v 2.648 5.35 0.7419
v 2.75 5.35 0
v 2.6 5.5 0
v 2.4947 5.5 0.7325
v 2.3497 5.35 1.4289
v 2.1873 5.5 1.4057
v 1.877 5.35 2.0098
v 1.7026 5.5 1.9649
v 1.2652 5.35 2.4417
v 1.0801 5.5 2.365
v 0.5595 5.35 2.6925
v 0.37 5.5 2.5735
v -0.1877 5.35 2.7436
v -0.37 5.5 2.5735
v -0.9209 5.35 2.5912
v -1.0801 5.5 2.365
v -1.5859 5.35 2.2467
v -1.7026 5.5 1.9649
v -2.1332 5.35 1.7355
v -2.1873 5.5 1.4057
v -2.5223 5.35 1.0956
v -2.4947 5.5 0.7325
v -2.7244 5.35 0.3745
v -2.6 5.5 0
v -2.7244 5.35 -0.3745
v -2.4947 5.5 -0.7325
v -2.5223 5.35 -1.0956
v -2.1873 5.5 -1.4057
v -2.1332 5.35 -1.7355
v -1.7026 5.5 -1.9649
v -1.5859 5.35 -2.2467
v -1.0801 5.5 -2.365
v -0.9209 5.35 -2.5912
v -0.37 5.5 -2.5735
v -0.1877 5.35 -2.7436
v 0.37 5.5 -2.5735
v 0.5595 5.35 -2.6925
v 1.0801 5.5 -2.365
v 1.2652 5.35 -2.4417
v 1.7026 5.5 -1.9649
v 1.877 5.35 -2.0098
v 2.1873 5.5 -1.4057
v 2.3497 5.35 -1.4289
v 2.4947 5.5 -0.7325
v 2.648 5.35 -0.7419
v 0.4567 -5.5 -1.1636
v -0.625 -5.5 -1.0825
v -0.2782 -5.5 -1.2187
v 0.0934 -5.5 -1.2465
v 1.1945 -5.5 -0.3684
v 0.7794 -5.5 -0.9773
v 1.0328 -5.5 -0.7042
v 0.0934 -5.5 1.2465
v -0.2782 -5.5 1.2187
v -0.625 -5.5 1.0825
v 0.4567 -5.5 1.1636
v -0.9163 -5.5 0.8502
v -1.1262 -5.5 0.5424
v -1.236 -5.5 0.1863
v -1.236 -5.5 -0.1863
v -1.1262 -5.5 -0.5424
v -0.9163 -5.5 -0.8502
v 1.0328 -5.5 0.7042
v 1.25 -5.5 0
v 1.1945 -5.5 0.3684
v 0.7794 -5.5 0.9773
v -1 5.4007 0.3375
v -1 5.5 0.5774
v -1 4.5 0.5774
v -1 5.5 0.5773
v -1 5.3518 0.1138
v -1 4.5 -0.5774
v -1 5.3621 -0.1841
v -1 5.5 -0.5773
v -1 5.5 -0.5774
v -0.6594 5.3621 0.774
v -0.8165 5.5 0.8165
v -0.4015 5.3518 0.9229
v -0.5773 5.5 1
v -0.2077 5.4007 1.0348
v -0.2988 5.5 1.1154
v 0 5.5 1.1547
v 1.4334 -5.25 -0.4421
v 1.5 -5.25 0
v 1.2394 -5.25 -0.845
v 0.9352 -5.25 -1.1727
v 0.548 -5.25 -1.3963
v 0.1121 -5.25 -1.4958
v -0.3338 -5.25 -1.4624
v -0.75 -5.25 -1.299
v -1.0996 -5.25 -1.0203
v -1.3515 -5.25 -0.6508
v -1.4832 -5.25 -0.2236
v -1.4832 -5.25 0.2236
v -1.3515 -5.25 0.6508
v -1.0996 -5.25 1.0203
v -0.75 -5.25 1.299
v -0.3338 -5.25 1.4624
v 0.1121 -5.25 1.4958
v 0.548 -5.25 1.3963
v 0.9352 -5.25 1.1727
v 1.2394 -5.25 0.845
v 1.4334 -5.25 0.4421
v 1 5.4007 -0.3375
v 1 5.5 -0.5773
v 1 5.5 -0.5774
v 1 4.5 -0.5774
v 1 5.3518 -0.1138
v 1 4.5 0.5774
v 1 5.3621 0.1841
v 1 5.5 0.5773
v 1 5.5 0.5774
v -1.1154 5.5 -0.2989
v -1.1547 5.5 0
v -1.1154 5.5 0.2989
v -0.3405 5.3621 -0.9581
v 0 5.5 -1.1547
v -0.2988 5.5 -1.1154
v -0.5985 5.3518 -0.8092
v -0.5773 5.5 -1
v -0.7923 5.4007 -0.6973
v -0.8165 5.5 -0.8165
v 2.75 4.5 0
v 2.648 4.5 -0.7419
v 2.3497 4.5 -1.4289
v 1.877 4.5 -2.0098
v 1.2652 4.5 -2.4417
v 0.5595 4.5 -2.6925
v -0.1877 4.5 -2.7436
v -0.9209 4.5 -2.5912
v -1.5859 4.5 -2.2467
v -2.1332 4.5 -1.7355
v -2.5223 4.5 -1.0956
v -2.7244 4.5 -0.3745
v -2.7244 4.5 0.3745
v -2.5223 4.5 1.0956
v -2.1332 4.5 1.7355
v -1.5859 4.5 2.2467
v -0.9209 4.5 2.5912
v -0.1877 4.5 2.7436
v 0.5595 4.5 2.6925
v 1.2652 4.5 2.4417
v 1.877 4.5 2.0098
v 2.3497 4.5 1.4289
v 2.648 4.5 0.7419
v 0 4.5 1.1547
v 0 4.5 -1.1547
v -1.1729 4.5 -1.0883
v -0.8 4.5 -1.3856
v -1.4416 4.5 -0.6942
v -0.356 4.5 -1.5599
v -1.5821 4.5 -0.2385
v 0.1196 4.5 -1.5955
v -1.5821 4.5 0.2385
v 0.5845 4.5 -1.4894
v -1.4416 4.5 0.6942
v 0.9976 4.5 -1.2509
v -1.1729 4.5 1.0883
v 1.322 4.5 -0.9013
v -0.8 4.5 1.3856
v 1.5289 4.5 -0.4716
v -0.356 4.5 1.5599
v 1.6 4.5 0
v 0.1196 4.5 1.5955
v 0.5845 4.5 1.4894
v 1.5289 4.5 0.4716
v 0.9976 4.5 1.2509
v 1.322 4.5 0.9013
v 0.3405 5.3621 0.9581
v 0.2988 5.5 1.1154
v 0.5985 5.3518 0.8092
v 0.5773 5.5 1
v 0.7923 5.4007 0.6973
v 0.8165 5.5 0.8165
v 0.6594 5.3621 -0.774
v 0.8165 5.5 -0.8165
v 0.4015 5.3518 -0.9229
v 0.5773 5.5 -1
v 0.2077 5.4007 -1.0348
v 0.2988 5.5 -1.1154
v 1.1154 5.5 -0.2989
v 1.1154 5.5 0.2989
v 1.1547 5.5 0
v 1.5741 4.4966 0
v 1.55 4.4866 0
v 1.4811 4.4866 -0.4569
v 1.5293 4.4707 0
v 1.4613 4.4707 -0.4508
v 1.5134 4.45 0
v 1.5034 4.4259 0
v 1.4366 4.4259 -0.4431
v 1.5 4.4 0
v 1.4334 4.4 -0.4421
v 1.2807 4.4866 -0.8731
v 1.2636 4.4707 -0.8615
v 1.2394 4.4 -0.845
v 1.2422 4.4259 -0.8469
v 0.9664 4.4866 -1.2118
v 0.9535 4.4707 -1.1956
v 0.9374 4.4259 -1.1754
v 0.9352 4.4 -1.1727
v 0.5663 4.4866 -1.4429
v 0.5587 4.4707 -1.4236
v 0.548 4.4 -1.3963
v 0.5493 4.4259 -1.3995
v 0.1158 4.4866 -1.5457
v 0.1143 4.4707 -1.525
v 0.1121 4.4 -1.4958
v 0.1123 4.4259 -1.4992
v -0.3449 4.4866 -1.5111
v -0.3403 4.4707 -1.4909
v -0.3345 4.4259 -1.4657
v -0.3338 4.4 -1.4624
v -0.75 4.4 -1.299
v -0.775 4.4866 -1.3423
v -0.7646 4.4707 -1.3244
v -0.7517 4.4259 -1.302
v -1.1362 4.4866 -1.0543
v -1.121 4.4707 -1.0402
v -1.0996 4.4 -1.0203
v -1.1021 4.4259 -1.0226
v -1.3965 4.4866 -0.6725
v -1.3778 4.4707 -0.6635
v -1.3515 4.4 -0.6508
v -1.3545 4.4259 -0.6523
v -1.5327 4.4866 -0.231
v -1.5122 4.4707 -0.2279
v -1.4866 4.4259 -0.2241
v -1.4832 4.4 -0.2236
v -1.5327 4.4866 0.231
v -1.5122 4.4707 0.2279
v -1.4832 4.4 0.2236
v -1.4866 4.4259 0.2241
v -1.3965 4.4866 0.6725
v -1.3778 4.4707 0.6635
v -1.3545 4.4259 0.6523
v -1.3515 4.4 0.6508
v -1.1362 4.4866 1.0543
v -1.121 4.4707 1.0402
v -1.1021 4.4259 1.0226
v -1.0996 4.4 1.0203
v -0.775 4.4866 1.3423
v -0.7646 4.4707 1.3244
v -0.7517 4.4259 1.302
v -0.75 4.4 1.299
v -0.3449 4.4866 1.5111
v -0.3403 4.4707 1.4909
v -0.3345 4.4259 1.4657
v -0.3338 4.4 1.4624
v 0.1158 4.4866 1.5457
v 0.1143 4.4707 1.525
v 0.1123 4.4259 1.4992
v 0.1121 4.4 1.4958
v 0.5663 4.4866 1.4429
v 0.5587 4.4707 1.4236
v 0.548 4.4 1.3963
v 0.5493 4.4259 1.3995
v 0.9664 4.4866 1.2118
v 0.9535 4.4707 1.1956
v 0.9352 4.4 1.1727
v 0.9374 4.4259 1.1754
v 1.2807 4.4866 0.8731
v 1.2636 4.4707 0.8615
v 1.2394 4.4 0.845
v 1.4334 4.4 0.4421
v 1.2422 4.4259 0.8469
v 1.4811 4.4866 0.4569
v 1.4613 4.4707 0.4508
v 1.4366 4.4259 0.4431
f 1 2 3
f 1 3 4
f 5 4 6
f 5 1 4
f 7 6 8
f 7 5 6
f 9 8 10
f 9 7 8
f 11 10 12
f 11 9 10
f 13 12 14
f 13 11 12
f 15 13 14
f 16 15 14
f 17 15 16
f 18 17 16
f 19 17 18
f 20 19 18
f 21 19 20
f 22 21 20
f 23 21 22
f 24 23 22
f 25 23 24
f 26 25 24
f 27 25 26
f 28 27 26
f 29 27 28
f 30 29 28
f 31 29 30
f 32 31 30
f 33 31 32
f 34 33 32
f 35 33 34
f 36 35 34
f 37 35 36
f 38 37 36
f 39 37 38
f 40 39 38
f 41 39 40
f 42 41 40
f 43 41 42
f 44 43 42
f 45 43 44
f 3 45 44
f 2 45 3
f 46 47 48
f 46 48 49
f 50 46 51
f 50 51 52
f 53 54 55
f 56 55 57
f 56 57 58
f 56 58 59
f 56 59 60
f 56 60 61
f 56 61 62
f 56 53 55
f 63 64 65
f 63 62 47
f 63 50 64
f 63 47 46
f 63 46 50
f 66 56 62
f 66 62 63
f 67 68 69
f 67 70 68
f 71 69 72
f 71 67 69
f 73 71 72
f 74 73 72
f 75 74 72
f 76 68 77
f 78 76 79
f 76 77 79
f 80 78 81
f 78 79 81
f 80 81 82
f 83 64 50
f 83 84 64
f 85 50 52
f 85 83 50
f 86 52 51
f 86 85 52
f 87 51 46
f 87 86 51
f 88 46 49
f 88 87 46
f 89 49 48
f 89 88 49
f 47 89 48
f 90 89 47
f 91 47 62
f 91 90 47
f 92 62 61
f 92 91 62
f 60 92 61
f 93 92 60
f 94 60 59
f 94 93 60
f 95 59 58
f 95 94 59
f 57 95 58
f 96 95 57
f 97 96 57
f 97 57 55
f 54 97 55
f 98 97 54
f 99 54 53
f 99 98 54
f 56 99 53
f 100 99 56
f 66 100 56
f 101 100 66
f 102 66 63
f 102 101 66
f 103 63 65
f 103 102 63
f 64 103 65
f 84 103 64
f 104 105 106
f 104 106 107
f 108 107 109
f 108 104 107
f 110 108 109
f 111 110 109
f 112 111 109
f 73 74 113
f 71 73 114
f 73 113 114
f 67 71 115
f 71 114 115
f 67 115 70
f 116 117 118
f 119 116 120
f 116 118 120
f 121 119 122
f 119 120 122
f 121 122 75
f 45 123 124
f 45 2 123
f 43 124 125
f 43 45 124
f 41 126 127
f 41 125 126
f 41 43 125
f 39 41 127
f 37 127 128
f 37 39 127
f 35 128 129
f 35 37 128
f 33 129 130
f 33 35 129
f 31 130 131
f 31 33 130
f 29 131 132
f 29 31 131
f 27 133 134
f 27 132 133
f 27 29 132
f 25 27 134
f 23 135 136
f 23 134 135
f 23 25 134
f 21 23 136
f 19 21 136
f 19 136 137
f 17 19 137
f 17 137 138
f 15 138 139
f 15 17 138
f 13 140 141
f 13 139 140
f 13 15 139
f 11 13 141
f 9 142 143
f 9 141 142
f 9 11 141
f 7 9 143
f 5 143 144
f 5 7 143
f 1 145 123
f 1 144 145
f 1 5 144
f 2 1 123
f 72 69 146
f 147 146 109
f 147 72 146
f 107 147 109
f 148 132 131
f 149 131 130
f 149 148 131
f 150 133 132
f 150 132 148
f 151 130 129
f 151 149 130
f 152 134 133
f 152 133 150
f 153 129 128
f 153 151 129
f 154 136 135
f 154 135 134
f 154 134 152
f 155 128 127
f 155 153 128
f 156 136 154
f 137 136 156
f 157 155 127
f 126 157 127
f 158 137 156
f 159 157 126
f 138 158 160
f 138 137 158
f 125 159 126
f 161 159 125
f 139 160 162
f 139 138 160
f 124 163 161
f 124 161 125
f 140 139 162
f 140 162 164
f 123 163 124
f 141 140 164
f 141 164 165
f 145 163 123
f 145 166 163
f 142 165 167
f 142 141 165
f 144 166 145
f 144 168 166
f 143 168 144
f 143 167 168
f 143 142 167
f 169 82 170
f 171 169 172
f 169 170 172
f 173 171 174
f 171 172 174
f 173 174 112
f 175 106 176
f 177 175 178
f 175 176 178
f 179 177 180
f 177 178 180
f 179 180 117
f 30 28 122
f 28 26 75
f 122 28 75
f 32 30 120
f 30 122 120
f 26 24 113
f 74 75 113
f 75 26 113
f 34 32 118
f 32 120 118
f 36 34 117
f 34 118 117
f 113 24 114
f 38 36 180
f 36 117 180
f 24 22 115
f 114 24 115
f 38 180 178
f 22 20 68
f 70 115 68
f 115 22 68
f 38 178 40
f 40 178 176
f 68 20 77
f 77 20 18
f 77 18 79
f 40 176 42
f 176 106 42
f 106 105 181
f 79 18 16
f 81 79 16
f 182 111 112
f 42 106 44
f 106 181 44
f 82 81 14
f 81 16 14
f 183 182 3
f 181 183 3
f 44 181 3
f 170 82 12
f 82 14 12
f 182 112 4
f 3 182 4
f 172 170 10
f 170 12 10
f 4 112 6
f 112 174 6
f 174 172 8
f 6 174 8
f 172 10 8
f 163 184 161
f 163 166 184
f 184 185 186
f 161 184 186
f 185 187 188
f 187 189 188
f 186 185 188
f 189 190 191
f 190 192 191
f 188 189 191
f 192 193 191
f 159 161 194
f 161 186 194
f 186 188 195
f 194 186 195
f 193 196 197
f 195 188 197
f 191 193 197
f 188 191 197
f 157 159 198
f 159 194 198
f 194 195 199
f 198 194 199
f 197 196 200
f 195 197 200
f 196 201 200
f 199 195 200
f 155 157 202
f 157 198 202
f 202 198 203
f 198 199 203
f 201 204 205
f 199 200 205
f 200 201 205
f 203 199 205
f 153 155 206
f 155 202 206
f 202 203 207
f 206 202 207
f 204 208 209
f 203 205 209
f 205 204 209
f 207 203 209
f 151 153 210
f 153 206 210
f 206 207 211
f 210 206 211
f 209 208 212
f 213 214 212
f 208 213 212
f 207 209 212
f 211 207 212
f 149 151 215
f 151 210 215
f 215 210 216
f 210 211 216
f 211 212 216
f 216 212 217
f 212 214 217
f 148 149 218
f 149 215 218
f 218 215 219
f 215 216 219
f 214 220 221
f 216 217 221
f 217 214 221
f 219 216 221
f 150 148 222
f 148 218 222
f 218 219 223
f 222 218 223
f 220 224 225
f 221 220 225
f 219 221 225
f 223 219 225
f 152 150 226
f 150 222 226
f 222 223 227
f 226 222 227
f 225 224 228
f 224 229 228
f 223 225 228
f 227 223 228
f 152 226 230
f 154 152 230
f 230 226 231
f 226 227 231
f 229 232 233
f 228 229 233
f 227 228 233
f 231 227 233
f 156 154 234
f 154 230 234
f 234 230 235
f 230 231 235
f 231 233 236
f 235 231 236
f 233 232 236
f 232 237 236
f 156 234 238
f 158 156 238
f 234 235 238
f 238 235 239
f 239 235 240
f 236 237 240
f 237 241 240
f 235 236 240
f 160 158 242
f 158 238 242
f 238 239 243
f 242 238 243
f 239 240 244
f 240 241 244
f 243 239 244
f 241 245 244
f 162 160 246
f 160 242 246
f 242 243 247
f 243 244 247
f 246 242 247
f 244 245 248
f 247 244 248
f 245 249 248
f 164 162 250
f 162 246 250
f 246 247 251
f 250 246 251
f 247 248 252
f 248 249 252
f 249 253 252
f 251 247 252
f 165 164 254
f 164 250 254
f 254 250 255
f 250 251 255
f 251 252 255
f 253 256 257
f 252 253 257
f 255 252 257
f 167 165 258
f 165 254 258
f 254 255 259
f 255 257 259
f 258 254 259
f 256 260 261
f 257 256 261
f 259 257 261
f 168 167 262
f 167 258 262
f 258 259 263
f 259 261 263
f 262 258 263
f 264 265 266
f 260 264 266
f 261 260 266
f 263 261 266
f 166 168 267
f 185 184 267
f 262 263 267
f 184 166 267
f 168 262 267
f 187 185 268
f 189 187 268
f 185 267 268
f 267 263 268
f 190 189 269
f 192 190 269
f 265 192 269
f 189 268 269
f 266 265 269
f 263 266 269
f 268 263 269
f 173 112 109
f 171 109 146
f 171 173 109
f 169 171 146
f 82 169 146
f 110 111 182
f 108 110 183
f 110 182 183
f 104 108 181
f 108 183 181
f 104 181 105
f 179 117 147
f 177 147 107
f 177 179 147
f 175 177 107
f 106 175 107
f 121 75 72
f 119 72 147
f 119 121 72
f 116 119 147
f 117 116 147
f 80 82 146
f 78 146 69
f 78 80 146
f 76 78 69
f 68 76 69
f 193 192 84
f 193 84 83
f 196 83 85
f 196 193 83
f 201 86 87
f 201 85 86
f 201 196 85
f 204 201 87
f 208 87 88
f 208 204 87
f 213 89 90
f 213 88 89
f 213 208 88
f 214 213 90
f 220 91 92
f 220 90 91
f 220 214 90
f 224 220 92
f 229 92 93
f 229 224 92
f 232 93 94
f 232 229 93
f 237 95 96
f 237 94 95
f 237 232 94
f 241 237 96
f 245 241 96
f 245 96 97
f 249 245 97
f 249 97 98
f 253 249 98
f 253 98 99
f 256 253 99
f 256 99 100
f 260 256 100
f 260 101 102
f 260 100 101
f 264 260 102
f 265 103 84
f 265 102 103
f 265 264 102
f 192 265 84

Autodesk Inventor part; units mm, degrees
ref_plane "YZ Plane" through (0, 0, 0) normal (1, 0, 0) x (0, 1, 0)
ref_plane "XZ Plane" through (0, 0, 0) normal (0, 1, 0) x (-1, 0, 0)
ref_plane "XY Plane" through (0, 0, 0) normal (0, 0, 1) x (1, 0, 0)
sketch "Sketch1" plane through (0, 0, 0) normal (0, 0, 1) x (1, 0, 0)
  line L0 (0, 5.5) -> (0, -5.5)
  line L1 (0, -5.5) -> (1.25, -5.5)
  line L2 (1.25, -5.5) -> (1.5, -5.25)
  line L3 (1.5, -5.25) -> (1.5, 4.4)
  line L4 (1.6, 4.5) -> (2.75, 4.5)
  line L5 (2.75, 4.5) -> (2.75, 5.35)
  line L6 (2.6, 5.5) -> (0, 5.5)
  arc A0 (1.6, 4.5) -> (1.5, 4.4) centre (1.6, 4.4) ccw
  line L7 (2.6, 5.5) -> (2.75, 5.35)
  point P0 (0, 0)
  point P1 (2.75, 5.5)
  point P2 (0, 0)
  dimension "d0" = 5.5
  dimension "d1" = 1
  dimension "d3" = 3
  dimension "d4" = 3.2
  dimension "d5" = 135
  dimension "d6" = 0.25
  dimension "d7" = 10
  dimension "d18" = 0.15
  dimension "d22" = 0.15
revolve "Revolution1" add sketch "Sketch1" angle 360 about axis through (0, 5.5, 0) along (0, -1, 0)
sketch "Sketch2" plane through (0, 5.5, 0) normal (0, 1, 0) x (1, 0, 0)
  line L0 (0, -1.1547) -> (-1, -0.5774)
  line L1 (-1, -0.5774) -> (-1, 0.5774)
  line L2 (-1, 0.5774) -> (0, 1.1547)
  line L3 (0, 1.1547) -> (1, 0.5774)
  line L4 (1, 0.5774) -> (1, -0.5774)
  line L5 (1, -0.5774) -> (0, -1.1547)
  point P0 (0, 0)
  point P1 (0, 0)
  dimension "d11" = 2
extrude "Extrusion1" cut sketch "Sketch2" against normal blind 1
thread "Thread1" size "M3x0.5" class "6g" standard "ANSI Metric M Profile" full length
sketch "Sketch3" plane through (0, 0, 0) normal (1, 0, 0) x (0, 1, 0)
  line L0 (5.5, 1.1547) -> (5.5, 0.5774) projected
  line L1 (5.5, 1.1547) -> (5, 0.6547)
  line L2 (5, 0.6547) -> (5.5, 0.6547)
  line L3 (5.5, 0.6547) -> (5.5, 1.1547)
  line L4 (-0.9, 0) -> (5.4, 0) projected
  point P0 (0, 0)
  dimension "d16" = 0.5
revolve "Revolution2" cut sketch "Sketch3" angle 360 about axis through (0, -10, 0) along (0, 1, 0)
equation "\"d22\" = d18"
properties part number "48-03A1" material "Stainless Steel"
